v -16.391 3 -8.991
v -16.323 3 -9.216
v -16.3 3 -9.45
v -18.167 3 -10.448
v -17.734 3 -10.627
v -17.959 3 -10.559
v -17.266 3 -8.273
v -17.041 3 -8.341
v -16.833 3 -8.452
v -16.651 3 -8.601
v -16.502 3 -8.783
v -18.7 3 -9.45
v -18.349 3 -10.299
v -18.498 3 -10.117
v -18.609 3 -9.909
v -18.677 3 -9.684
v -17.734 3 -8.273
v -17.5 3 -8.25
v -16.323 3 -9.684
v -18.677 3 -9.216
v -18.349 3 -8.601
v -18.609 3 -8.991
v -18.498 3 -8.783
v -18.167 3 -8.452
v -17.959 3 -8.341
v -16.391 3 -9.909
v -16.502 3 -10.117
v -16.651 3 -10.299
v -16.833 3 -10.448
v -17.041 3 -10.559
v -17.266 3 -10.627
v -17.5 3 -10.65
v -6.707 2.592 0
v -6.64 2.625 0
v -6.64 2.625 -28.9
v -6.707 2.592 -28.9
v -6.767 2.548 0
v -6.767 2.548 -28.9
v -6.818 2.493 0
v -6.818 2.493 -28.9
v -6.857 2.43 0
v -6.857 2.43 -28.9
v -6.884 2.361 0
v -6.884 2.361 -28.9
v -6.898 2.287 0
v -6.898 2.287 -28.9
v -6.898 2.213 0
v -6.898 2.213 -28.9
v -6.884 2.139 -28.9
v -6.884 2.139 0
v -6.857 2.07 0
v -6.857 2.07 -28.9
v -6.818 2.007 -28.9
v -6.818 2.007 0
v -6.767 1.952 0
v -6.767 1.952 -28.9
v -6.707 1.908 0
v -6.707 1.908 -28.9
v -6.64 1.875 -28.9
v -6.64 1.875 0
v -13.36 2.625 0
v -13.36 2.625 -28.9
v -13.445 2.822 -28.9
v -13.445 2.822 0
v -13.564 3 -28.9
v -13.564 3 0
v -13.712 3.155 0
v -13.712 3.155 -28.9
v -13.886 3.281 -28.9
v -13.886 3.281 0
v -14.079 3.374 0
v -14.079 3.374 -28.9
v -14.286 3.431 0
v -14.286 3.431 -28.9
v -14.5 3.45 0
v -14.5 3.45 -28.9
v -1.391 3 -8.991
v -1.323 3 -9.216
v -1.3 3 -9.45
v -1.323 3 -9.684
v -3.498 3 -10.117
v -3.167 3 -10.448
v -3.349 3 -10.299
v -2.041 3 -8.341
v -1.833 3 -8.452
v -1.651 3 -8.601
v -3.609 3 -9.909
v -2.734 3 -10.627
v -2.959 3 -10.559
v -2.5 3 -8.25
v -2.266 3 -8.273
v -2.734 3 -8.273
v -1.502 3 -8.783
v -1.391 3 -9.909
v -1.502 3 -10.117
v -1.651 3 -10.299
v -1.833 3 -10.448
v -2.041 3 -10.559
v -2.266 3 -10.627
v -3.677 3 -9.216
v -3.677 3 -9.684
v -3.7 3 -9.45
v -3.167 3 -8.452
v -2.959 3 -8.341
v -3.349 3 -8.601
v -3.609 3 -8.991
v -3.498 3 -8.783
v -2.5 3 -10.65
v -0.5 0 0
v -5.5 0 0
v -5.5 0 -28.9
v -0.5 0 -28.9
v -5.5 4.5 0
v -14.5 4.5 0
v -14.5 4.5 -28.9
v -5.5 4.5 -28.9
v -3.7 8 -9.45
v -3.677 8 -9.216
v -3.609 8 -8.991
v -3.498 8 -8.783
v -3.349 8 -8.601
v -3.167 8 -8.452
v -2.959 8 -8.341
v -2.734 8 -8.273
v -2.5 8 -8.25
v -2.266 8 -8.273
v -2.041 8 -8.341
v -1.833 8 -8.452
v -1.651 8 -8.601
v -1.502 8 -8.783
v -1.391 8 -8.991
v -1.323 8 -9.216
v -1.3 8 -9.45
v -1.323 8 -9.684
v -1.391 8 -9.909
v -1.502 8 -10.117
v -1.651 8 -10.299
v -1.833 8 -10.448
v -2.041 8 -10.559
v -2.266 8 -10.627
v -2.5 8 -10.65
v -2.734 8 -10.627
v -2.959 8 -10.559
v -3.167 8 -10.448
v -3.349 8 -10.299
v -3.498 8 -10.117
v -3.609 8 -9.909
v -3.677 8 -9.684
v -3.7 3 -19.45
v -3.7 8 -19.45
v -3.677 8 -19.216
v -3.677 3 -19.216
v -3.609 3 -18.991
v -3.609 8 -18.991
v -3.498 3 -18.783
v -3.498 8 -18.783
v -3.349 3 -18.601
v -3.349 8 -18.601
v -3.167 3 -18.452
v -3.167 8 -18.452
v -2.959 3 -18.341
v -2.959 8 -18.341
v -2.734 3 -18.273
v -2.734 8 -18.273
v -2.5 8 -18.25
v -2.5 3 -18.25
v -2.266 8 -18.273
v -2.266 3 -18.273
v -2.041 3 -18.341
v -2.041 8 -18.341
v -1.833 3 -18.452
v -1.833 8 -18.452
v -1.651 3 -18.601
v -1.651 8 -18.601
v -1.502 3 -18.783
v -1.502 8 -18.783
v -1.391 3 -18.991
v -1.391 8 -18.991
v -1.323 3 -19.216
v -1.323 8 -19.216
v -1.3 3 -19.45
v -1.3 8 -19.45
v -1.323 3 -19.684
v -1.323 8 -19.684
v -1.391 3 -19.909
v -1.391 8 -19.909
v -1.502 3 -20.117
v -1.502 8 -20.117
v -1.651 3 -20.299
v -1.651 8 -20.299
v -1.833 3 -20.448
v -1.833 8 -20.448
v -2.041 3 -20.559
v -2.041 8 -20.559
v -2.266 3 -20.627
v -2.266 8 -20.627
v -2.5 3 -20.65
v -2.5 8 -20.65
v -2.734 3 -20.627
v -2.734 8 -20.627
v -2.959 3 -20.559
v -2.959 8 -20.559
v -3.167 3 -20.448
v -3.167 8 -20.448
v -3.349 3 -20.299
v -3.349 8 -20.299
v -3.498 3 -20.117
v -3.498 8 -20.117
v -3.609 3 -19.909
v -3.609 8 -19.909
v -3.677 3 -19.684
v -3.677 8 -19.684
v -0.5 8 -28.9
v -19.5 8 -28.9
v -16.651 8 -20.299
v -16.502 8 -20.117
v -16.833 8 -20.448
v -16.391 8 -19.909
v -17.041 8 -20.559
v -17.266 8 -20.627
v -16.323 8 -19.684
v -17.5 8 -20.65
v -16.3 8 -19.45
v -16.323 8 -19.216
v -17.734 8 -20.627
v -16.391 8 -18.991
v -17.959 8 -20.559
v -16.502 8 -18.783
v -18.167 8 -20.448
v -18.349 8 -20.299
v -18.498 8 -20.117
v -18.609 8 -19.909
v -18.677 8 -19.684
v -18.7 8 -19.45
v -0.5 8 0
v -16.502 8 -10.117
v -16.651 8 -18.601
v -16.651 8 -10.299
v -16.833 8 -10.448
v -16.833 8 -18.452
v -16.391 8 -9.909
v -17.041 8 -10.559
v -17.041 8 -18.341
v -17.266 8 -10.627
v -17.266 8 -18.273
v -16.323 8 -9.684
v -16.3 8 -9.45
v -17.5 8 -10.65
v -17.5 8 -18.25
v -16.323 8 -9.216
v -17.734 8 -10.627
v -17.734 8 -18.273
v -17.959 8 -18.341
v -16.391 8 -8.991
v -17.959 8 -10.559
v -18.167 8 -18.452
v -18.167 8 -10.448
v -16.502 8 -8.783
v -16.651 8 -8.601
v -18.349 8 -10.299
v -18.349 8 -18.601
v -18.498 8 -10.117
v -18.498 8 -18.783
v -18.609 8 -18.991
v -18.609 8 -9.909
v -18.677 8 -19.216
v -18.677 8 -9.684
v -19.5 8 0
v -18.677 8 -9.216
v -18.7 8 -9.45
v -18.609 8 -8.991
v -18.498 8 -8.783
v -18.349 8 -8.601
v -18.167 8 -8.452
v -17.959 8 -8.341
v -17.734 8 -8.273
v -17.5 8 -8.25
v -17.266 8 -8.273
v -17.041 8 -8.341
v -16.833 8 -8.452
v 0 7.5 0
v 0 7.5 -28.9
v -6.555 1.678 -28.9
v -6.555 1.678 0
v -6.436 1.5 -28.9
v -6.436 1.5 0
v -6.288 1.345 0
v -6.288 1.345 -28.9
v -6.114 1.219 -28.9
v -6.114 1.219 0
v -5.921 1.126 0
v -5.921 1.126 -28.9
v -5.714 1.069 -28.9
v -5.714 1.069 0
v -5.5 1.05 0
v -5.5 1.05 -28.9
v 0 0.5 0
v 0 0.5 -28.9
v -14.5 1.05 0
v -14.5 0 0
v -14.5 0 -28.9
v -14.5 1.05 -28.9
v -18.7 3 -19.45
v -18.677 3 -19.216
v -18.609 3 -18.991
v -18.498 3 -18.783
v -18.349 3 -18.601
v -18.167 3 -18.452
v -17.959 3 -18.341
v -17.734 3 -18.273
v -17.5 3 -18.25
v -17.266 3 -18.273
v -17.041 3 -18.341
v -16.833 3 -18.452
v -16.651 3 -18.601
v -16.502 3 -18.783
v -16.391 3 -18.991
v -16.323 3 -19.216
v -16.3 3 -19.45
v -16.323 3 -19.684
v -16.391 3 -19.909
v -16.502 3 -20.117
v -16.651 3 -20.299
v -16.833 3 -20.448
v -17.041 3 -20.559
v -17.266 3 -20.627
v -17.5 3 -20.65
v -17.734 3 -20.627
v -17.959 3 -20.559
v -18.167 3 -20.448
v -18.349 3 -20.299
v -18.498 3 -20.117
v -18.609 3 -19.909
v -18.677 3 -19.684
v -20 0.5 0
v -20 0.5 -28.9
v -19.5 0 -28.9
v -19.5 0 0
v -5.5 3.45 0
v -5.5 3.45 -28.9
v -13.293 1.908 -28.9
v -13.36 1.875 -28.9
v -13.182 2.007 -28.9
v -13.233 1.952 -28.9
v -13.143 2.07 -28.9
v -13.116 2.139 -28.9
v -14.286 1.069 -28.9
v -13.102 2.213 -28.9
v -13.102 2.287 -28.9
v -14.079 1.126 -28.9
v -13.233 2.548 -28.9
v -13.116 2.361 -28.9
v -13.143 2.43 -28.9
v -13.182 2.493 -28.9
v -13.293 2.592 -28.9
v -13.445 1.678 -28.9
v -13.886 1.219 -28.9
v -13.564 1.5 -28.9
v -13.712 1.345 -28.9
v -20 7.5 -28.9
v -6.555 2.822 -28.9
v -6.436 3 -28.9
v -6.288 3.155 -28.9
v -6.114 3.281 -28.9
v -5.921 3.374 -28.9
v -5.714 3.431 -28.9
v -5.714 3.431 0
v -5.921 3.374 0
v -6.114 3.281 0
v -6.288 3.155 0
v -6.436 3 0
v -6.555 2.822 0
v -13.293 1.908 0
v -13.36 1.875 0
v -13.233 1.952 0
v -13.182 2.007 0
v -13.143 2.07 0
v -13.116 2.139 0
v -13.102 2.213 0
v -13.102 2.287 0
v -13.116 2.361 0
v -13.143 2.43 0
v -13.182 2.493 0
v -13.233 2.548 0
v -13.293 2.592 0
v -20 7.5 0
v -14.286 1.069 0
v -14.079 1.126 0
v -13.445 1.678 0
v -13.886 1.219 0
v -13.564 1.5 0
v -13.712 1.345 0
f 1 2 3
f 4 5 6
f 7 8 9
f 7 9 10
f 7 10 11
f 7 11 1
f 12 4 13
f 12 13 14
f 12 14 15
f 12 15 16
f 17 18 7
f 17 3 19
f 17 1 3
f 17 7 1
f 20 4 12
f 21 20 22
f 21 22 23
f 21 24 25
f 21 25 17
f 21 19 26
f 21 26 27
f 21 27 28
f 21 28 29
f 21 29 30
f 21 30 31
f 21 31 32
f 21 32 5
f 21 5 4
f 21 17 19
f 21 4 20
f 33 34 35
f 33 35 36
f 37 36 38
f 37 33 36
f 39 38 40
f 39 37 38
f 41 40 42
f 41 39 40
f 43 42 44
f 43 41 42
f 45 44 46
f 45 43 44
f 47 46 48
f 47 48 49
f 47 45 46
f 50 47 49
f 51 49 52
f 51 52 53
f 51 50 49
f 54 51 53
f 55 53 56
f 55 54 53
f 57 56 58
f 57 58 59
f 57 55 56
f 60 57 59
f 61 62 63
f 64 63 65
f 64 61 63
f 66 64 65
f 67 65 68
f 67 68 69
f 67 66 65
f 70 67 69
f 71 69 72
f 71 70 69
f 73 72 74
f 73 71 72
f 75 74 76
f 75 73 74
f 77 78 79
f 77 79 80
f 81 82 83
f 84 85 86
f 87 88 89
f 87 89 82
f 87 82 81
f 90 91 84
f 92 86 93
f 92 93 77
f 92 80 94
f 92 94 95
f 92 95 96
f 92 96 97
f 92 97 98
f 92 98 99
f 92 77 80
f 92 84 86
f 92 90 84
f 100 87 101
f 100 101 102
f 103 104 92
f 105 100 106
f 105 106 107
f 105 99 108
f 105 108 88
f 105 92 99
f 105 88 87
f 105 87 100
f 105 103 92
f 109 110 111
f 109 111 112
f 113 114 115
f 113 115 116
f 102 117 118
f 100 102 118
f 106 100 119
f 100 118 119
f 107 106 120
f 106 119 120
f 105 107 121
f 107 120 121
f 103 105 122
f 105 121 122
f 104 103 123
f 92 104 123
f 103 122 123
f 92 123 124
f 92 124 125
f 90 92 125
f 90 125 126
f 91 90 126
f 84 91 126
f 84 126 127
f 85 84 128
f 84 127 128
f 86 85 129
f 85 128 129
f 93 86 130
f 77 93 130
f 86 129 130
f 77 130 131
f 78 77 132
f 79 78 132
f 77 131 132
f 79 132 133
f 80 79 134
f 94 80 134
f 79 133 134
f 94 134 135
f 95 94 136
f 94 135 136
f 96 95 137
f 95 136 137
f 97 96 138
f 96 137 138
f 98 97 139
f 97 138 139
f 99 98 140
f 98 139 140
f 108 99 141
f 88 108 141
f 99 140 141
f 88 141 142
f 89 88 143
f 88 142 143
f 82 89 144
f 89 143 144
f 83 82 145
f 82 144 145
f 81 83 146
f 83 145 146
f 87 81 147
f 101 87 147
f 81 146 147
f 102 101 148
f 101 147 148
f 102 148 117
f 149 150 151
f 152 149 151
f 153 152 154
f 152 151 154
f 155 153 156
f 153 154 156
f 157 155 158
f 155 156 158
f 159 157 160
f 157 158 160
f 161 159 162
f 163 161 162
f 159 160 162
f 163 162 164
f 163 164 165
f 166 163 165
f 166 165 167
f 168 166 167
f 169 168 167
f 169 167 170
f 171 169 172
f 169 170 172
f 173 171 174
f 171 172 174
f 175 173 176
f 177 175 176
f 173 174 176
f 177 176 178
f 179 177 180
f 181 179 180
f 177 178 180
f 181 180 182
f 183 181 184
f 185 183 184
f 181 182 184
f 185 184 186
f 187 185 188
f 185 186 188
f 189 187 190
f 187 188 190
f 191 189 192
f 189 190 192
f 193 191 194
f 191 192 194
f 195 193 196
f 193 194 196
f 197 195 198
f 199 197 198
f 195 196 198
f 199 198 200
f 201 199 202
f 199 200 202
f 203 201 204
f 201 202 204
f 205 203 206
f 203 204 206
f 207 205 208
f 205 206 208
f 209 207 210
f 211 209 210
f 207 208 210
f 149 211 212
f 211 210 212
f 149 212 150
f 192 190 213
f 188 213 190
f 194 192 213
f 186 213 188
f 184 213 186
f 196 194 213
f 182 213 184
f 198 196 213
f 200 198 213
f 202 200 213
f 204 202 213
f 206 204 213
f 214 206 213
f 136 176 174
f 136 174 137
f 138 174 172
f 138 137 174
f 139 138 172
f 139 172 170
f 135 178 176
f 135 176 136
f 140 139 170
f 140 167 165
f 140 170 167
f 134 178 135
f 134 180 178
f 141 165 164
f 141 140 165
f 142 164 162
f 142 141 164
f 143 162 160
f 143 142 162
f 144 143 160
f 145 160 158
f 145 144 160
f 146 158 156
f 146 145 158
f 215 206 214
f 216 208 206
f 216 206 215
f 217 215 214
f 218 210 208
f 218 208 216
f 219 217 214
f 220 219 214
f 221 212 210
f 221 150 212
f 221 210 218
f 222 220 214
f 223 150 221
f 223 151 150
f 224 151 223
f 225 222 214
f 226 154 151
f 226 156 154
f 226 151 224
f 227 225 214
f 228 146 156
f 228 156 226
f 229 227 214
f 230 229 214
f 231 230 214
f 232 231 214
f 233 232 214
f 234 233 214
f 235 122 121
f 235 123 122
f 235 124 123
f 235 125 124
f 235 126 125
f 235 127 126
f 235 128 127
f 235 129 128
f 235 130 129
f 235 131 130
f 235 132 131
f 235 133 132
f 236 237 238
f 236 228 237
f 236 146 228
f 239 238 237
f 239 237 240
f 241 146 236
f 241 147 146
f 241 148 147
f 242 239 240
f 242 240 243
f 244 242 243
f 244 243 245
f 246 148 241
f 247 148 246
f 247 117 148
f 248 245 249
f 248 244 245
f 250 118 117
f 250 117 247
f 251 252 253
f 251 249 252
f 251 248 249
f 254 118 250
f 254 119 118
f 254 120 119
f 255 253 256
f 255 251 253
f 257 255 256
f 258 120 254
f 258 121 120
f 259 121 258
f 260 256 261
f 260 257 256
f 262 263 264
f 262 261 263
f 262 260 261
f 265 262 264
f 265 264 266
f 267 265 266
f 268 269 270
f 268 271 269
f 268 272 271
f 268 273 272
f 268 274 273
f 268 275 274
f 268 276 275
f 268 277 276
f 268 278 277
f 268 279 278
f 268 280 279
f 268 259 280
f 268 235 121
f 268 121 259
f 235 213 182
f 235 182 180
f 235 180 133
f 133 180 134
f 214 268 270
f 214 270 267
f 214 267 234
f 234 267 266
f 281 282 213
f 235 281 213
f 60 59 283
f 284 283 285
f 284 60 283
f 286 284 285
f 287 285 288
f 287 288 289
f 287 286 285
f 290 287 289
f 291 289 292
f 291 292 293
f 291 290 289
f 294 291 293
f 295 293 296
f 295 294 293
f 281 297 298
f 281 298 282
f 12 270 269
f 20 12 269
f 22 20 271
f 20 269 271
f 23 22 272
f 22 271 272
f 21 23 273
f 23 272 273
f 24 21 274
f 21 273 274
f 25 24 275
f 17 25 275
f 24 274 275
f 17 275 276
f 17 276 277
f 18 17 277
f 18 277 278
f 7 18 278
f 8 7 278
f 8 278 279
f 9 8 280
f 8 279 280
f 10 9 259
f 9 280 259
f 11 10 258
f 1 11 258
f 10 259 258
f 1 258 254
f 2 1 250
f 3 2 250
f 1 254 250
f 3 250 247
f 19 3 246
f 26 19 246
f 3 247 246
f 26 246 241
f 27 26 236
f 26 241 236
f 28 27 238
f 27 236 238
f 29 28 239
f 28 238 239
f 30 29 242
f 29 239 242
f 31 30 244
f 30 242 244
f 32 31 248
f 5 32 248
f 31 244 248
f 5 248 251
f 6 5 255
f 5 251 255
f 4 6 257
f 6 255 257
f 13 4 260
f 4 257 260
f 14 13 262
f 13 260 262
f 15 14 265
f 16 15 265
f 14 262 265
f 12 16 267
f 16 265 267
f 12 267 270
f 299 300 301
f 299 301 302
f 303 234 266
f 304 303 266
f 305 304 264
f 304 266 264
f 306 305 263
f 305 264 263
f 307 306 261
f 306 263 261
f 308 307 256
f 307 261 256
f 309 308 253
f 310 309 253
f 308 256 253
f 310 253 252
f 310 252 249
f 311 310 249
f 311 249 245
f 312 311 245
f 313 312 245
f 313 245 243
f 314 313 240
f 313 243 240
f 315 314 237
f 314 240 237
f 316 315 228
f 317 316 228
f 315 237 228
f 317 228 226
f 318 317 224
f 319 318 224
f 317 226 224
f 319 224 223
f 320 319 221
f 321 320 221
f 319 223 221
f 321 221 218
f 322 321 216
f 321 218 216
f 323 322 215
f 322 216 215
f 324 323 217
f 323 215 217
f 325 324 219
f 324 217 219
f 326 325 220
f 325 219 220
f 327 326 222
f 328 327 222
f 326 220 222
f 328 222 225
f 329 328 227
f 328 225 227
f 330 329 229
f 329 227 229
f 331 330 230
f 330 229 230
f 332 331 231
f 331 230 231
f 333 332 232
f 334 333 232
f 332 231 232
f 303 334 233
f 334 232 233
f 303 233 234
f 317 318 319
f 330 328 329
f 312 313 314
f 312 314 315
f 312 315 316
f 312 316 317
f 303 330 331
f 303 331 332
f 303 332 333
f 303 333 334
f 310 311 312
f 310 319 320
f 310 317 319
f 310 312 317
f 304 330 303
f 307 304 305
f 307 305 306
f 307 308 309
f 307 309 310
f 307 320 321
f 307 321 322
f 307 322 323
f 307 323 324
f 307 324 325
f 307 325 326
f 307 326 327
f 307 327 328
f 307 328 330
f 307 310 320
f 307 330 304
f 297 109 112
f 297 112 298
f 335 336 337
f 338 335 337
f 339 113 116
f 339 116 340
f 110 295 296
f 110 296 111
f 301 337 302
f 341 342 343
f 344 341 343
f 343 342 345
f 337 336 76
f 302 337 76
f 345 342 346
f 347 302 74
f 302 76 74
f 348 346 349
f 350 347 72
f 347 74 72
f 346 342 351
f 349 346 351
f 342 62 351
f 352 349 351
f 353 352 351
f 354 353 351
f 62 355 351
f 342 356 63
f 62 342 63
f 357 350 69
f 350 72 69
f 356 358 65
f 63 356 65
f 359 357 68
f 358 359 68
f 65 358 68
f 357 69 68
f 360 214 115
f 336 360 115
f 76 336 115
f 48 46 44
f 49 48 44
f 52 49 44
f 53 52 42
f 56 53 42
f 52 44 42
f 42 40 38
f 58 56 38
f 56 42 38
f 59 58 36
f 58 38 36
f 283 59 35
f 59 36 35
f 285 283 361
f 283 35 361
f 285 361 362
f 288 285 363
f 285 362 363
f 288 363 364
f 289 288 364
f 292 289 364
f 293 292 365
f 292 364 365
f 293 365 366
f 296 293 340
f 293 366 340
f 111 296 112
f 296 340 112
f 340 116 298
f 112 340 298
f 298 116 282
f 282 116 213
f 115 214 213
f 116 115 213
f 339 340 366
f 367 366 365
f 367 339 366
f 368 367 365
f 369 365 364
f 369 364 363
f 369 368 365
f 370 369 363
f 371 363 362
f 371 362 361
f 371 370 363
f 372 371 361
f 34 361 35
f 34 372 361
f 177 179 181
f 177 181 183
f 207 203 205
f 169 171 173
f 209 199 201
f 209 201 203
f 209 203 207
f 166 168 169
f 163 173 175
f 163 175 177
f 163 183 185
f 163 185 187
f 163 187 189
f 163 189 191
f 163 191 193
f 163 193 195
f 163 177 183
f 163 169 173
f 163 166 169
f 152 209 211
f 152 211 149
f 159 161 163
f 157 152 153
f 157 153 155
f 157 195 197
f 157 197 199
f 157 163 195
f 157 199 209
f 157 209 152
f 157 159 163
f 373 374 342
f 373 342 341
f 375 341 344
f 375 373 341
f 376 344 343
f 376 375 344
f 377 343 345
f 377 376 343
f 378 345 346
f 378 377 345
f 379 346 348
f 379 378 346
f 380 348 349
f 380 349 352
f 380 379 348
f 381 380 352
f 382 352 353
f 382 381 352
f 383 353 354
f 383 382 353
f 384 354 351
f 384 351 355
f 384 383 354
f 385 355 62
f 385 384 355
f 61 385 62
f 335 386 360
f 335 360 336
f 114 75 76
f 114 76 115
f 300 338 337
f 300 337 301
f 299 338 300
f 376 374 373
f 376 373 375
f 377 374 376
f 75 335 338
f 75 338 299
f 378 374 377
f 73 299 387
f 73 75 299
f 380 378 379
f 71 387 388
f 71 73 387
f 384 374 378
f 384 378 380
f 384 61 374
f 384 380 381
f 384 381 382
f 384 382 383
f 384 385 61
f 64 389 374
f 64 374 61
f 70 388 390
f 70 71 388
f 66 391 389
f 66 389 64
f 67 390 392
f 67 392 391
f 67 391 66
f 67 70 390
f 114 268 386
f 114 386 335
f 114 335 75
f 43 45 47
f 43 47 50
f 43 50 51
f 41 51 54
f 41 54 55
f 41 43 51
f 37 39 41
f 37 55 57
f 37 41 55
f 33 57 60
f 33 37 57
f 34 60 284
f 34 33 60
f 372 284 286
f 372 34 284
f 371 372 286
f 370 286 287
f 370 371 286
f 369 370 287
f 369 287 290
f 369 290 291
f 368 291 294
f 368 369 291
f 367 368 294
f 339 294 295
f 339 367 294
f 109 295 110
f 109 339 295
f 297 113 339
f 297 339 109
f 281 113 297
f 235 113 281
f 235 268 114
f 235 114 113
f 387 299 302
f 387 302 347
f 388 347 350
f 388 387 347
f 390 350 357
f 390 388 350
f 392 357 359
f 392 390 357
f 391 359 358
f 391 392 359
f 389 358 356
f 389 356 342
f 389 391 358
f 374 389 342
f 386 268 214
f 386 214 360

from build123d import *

# Parameters (mm, degrees)
EXTRUDE_1_DEPTH     = 28.9
SKETCH_2_R          = 1.2
CUT_EXTRUDE_1_DEPTH = 5


with BuildPart() as part:
    # 草图1 → 凸台-拉伸1 (new body)
    with BuildSketch(Plane.XY):
        with BuildLine():
            Line((-19.5, 8), (-20, 7.5))
            Line((-20, 7.5), (-20, 0.5))
            Line((-20, 0.5), (-19.5, 0))
            Line((-19.5, 0), (-14.5, 0))
            Line((-14.5, 0), (-14.5, 1.05))
            ThreePointArc((-14.5, 1.05), (-13.796309676, 1.277981519), (-13.36, 1.87530012))
            ThreePointArc((-13.36, 1.87530012), (-13.1, 2.25), (-13.36, 2.62469988))
            ThreePointArc((-13.36, 2.62469988), (-13.796309676, 3.222018481), (-14.5, 3.45))
            Line((-14.5, 3.45), (-14.5, 4.5))
            Line((-14.5, 4.5), (-5.5, 4.5))
            Line((-5.5, 4.5), (-5.5, 3.45))
            ThreePointArc((-5.5, 3.45), (-6.203690324, 3.222018481), (-6.64, 2.62469988))
            ThreePointArc((-6.64, 2.62469988), (-6.9, 2.25), (-6.64, 1.87530012))
            ThreePointArc((-6.64, 1.87530012), (-6.203690324, 1.277981519), (-5.5, 1.05))
            Line((-5.5, 1.05), (-5.5, 0))
            Line((-5.5, 0), (-0.5, 0))
            Line((-0.5, 0), (0, 0.5))
            Line((0, 0.5), (0, 7.5))
            Line((0, 7.5), (-0.5, 8))
            Line((-0.5, 8), (-19.5, 8))
        make_face()
    extrude(amount=-EXTRUDE_1_DEPTH)

    # 草图2 → 切除-拉伸1 (cut)
    with BuildSketch(Plane(origin=(0, 8, 0), x_dir=(1, 0, 0), z_dir=(0, 1, 0))):
        with Locations(Location((-17.5, 19.45, 0), (0, 0, 180))):
            Circle(SKETCH_2_R)
        with Locations(Location((-2.5, 19.45, 0), (0, 0, 180))):
            Circle(SKETCH_2_R)
        with Locations(Location((-2.5, 9.45, 0), (0, 0, 180))):
            Circle(SKETCH_2_R)
        with Locations(Location((-17.5, 9.45, 0), (0, 0, 180))):
            Circle(SKETCH_2_R)
    extrude(amount=-CUT_EXTRUDE_1_DEPTH, mode=Mode.SUBTRACT)


solid = part.part
